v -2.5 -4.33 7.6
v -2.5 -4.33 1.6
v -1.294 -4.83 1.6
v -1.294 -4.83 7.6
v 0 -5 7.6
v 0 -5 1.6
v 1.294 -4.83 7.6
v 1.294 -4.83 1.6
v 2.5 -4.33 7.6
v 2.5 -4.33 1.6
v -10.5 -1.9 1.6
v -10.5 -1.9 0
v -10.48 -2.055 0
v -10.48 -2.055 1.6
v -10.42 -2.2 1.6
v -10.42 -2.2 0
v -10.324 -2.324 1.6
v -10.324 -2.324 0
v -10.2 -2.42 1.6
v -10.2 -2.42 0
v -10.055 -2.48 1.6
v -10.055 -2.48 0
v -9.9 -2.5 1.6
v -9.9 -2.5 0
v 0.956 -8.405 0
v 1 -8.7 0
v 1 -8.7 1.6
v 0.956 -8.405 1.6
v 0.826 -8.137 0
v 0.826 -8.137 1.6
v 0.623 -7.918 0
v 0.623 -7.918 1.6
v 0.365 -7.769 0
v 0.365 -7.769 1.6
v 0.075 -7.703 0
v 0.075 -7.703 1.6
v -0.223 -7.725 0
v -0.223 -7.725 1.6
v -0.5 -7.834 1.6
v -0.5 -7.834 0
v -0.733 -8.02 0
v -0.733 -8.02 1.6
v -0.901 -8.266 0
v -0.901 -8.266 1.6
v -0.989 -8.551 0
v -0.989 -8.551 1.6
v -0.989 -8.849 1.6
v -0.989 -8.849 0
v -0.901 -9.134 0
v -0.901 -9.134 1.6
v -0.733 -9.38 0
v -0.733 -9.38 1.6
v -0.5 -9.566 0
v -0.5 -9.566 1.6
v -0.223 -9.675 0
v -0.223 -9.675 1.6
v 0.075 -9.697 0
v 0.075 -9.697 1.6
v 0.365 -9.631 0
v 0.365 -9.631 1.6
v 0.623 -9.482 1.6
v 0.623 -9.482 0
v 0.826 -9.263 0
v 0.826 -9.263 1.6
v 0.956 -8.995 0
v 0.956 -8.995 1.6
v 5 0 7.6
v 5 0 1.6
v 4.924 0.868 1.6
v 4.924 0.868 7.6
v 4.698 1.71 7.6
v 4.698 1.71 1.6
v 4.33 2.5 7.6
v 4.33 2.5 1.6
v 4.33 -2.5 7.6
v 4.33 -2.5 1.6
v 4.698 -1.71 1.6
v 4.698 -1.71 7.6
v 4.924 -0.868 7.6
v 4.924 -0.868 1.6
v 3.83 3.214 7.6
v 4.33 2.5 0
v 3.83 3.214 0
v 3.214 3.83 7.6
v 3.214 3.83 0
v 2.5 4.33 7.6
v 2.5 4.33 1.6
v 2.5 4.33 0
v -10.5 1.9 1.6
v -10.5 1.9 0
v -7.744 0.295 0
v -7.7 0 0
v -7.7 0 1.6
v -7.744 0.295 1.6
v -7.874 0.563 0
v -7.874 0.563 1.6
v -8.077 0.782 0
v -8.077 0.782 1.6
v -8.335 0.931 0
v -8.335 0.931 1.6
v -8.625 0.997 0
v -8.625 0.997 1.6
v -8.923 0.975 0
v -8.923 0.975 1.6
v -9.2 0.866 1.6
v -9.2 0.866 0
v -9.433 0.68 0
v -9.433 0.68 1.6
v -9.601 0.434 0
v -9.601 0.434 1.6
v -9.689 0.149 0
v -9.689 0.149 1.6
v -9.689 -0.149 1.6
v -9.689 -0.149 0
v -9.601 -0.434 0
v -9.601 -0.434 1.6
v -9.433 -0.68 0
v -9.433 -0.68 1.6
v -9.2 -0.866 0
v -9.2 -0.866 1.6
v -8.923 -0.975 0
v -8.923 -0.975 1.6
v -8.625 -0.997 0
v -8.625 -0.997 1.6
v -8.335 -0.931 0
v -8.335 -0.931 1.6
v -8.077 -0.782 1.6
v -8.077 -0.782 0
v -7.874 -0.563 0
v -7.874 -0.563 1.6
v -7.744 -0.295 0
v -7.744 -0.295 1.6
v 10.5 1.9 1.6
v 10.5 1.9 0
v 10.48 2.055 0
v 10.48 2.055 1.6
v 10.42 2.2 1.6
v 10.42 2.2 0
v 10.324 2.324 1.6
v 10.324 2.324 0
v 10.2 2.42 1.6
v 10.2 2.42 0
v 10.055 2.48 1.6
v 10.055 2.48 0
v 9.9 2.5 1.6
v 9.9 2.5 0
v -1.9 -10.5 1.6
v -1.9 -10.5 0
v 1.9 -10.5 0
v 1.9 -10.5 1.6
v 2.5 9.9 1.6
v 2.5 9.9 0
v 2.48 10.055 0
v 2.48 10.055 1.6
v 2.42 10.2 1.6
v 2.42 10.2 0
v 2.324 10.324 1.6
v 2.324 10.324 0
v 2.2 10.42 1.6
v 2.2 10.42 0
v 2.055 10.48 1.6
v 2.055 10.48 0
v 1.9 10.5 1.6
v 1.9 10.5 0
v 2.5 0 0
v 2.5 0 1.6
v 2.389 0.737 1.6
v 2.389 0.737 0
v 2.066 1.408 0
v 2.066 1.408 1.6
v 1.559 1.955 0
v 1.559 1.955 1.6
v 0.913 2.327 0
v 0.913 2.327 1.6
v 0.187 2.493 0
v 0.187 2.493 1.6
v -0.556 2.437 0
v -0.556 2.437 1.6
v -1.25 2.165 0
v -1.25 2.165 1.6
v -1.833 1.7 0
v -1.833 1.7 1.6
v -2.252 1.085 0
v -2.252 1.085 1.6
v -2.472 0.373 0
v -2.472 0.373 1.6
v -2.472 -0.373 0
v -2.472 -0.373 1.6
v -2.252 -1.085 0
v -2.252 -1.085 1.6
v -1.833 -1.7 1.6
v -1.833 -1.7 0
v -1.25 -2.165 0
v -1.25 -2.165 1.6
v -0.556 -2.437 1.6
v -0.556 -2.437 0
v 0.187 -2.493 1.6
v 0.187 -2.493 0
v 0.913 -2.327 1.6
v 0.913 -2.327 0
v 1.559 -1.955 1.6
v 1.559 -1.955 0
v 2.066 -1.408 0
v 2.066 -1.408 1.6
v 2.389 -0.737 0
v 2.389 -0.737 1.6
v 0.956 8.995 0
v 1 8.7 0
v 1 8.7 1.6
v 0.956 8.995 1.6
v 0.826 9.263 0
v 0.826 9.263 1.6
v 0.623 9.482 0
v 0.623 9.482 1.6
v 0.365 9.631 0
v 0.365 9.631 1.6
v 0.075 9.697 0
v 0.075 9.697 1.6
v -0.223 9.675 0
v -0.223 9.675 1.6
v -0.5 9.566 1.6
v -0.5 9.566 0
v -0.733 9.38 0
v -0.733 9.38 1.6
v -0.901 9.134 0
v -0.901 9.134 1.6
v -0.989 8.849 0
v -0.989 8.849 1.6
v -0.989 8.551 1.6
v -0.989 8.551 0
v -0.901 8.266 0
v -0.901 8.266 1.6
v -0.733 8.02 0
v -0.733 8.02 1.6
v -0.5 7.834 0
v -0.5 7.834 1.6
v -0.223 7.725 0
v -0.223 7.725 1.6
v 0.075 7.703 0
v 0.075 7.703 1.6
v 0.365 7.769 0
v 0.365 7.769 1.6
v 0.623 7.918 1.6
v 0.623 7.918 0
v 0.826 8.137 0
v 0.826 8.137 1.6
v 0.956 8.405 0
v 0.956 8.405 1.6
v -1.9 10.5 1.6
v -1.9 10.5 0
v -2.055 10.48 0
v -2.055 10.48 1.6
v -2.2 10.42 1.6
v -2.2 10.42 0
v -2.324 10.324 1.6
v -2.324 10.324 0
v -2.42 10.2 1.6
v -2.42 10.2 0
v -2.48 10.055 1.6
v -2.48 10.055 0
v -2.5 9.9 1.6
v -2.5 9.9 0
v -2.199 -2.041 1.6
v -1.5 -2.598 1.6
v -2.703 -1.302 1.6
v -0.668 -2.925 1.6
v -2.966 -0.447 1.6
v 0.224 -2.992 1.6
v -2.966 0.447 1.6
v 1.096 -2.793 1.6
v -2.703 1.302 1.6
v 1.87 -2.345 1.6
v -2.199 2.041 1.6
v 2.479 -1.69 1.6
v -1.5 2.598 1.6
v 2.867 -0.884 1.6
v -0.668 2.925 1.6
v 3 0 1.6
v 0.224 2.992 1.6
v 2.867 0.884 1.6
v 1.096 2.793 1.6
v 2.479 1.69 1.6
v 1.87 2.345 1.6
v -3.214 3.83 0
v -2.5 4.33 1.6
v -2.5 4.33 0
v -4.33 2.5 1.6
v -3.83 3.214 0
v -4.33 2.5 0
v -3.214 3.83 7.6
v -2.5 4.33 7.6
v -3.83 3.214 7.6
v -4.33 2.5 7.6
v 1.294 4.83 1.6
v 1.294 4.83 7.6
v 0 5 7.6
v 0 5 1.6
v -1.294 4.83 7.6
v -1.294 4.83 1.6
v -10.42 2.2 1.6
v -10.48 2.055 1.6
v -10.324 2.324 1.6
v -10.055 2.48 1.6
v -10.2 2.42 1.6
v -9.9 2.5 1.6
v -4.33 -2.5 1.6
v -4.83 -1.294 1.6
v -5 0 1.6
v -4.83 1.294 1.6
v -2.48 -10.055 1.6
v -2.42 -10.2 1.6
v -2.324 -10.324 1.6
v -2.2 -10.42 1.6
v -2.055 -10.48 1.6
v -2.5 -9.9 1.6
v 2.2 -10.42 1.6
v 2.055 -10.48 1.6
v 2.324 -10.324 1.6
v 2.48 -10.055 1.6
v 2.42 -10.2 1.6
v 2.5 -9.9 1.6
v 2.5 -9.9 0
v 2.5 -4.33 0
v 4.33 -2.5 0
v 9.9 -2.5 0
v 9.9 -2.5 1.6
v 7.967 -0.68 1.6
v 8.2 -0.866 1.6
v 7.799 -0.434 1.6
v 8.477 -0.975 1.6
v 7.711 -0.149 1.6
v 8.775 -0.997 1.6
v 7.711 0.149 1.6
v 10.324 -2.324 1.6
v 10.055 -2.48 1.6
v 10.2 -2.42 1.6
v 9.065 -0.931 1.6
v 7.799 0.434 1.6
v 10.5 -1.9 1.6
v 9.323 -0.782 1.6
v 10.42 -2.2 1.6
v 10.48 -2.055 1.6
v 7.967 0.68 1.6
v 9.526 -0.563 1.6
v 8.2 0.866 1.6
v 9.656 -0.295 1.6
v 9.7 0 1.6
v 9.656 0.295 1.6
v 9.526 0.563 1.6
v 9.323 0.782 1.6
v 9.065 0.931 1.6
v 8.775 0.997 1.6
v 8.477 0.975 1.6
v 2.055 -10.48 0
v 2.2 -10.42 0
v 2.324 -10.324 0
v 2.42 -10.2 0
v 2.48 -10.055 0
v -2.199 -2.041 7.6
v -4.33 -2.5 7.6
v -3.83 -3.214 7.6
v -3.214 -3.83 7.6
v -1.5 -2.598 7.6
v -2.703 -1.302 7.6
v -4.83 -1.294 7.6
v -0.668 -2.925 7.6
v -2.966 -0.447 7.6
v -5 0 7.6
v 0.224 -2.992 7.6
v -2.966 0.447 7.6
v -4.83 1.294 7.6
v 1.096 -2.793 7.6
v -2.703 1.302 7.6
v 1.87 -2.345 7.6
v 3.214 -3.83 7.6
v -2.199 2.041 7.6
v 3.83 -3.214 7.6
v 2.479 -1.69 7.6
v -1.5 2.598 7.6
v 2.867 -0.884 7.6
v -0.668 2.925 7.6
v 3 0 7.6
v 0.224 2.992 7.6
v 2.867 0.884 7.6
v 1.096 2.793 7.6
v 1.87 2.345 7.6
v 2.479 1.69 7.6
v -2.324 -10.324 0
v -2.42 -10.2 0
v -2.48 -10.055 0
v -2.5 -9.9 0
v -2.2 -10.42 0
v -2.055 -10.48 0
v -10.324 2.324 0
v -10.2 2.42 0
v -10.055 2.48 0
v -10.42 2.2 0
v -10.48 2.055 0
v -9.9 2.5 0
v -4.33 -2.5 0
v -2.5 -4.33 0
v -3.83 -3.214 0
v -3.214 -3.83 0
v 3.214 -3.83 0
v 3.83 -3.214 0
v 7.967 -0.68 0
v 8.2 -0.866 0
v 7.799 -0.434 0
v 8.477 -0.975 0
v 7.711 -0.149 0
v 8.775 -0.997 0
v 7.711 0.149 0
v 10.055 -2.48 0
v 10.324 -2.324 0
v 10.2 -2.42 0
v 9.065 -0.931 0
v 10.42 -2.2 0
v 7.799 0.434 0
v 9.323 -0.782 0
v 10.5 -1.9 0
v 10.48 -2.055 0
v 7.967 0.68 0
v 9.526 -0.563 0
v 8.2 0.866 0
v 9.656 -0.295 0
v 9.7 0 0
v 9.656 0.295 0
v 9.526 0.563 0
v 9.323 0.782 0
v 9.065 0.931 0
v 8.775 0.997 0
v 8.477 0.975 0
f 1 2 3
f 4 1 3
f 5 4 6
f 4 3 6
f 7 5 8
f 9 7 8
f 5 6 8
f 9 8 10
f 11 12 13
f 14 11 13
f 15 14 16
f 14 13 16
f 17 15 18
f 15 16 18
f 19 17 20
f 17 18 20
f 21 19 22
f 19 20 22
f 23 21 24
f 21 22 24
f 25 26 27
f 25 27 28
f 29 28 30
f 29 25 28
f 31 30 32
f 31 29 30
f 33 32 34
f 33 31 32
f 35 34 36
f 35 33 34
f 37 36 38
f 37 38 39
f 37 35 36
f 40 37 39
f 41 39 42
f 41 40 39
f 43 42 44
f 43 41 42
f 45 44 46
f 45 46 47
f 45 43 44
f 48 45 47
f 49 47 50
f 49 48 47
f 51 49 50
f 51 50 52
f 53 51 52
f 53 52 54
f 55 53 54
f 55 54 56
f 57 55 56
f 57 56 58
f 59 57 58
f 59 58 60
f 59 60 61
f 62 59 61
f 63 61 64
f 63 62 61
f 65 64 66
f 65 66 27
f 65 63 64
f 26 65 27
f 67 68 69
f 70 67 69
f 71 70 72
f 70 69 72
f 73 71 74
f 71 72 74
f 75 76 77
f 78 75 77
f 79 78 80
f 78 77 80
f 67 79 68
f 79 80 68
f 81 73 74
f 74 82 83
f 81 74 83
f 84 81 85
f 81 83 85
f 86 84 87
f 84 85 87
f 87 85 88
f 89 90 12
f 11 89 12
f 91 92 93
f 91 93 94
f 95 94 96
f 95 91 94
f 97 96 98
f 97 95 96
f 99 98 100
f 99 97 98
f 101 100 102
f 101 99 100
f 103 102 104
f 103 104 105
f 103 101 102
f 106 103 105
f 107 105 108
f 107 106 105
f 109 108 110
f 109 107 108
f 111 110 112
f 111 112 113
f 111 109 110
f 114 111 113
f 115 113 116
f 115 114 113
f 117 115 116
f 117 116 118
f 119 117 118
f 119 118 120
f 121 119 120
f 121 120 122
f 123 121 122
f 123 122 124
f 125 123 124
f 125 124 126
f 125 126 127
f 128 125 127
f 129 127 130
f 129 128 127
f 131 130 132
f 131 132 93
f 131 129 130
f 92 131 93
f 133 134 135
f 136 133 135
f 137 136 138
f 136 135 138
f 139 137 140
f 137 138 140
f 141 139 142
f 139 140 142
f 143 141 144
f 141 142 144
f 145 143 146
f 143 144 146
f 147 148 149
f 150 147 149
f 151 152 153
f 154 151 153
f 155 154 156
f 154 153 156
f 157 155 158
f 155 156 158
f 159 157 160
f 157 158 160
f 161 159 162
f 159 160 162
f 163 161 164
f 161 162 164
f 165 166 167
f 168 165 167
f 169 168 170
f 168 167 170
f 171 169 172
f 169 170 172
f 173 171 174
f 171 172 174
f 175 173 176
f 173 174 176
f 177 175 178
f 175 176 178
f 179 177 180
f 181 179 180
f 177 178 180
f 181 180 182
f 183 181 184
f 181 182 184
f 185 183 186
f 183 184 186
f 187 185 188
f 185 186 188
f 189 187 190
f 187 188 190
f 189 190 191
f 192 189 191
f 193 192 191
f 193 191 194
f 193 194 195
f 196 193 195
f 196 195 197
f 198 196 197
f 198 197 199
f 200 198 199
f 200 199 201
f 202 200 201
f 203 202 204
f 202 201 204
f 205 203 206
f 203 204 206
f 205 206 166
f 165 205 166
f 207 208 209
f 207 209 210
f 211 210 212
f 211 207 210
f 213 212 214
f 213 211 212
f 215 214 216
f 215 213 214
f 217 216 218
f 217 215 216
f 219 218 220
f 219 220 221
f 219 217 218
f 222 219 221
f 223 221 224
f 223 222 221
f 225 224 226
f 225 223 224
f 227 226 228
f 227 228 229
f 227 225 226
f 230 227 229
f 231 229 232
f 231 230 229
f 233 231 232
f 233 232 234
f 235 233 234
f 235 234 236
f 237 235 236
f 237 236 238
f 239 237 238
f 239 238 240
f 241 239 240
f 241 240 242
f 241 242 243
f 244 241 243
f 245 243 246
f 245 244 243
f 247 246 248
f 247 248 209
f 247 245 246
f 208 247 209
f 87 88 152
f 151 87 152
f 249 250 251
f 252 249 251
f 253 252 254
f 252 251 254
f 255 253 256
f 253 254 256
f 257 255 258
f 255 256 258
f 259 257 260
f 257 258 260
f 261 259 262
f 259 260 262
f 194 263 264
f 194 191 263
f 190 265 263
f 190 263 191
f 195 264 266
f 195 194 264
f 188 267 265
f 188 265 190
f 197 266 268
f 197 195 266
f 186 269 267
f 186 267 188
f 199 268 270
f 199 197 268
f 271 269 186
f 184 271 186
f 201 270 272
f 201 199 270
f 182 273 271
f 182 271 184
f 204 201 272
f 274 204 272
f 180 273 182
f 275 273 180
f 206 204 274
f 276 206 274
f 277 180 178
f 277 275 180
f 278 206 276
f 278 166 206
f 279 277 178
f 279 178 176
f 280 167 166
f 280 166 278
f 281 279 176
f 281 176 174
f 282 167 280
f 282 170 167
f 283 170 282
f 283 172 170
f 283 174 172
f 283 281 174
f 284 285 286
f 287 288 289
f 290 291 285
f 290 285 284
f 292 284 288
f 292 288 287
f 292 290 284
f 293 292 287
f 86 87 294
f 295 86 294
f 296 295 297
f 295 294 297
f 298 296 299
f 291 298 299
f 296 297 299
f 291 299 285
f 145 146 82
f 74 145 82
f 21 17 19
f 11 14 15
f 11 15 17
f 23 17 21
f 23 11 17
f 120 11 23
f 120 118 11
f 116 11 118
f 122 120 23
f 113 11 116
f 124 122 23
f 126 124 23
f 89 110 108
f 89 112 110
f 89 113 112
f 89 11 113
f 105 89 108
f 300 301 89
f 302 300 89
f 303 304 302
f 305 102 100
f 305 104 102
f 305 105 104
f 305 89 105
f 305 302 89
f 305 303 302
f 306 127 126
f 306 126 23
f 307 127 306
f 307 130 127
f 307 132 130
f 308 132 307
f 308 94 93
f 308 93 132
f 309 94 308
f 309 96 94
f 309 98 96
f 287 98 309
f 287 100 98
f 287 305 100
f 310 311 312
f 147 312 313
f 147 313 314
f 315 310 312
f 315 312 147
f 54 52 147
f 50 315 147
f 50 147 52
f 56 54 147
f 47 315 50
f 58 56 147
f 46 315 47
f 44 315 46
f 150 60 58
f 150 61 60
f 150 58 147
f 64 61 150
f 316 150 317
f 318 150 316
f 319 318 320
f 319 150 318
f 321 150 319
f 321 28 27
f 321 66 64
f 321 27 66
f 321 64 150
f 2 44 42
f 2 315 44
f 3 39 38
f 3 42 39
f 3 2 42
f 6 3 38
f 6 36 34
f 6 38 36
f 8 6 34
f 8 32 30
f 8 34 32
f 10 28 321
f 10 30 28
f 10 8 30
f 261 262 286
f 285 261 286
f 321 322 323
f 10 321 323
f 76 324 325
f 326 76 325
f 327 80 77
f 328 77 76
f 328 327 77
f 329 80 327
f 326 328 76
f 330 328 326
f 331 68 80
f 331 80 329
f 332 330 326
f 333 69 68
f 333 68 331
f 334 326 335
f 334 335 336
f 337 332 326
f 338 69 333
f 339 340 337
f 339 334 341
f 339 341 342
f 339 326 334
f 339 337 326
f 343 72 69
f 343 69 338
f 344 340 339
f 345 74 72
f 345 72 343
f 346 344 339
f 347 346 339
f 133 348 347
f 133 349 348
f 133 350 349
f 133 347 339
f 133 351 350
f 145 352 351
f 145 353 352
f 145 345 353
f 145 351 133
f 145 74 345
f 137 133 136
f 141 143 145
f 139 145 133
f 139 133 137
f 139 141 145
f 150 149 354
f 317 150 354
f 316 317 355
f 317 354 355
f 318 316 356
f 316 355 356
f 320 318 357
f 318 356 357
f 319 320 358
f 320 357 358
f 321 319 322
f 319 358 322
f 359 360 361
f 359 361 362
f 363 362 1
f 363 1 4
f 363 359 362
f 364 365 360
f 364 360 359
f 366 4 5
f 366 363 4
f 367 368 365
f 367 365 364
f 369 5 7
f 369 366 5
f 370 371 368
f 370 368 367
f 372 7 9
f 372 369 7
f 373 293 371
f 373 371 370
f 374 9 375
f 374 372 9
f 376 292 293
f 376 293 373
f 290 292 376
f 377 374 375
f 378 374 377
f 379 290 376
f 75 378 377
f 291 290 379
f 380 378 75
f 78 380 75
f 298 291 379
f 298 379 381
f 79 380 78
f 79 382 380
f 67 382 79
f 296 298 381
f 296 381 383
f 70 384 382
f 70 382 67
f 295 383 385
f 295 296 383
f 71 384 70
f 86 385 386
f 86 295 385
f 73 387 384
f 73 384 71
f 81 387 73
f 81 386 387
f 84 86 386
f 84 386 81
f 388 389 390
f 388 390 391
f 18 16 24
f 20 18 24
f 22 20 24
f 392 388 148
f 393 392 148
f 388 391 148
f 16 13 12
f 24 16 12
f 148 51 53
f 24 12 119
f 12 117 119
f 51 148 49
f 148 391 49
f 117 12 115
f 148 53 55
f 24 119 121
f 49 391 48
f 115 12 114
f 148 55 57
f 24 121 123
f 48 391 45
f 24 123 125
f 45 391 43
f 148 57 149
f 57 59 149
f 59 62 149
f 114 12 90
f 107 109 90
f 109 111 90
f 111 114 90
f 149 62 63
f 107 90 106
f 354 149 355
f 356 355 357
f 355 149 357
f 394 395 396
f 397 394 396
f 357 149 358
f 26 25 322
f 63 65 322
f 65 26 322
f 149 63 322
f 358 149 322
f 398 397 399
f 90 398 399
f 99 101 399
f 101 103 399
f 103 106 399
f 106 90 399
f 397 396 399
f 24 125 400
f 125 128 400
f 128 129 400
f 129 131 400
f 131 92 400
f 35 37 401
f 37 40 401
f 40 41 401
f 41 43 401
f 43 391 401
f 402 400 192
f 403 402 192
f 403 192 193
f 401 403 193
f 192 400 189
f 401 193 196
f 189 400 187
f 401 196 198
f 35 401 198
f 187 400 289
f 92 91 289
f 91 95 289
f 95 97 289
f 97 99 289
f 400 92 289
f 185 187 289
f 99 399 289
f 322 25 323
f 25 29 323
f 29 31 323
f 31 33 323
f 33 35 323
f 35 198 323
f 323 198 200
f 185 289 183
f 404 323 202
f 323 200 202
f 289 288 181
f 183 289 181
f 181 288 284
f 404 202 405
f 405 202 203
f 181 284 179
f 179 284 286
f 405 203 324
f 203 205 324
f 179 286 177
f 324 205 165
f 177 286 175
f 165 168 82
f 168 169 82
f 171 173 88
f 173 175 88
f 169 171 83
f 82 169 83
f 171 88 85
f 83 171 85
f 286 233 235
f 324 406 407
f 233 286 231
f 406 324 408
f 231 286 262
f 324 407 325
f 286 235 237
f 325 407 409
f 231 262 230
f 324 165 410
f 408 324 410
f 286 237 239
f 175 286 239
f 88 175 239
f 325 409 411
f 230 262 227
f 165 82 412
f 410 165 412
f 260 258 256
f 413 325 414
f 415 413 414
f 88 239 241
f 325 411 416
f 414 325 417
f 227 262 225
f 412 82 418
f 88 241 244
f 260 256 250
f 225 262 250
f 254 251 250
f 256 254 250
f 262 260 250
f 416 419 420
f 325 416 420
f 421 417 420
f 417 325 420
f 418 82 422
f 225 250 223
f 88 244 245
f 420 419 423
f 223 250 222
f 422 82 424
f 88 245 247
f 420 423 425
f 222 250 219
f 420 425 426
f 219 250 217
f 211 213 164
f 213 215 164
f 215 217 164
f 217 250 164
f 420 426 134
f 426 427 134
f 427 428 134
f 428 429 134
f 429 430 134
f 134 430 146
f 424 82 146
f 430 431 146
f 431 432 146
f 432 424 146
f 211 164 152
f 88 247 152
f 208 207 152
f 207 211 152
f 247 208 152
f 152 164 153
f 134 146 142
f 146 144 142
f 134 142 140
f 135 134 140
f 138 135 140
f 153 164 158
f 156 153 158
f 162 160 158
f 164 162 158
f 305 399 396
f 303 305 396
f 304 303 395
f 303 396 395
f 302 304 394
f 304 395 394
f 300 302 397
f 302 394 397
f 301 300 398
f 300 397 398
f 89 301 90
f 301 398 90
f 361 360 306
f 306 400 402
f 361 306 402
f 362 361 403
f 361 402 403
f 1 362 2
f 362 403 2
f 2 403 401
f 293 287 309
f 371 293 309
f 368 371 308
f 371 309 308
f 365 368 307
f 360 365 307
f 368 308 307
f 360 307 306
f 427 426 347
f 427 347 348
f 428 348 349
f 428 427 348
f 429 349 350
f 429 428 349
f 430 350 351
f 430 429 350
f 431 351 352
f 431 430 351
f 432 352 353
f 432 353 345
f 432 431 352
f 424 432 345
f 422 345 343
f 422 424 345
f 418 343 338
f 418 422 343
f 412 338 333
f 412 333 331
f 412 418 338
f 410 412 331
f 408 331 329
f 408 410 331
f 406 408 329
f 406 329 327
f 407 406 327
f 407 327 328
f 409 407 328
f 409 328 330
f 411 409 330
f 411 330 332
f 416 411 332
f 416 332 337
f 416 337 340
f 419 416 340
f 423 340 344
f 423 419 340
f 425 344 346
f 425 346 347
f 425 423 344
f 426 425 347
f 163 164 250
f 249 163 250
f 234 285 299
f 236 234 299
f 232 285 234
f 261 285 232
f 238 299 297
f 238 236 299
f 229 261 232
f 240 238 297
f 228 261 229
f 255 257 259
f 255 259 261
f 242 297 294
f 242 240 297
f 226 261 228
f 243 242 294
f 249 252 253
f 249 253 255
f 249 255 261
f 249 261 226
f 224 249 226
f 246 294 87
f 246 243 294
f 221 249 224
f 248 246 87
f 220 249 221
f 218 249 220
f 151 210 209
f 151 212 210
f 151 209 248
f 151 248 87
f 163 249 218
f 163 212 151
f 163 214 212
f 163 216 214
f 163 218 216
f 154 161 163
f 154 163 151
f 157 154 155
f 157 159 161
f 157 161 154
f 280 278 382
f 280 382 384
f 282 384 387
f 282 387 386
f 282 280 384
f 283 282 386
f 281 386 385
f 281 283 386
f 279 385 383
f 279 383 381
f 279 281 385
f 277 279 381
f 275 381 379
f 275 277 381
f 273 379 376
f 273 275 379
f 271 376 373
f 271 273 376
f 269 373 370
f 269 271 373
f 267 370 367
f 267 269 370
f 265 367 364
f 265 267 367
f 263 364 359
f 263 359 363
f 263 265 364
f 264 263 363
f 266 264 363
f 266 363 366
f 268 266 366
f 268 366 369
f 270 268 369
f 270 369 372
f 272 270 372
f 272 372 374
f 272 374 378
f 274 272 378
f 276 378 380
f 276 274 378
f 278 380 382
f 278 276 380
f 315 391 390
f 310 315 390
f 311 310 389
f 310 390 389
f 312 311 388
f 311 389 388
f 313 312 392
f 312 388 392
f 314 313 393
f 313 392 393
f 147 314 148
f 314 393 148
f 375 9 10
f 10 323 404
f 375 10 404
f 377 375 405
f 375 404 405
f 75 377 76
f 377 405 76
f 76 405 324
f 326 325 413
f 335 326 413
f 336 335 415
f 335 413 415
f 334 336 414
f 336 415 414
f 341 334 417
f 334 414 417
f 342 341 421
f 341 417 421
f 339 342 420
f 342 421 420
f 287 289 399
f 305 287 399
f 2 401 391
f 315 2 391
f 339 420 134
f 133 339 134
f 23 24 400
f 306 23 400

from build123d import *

# Parameters (mm, degrees)
F0_R     = 1
F0_W     = 5
F0_H     = 5
F1_DEPTH = 1.6
F2_R     = 3
F3_DEPTH = 6
F4_DEPTH = 1.6
F5_R     = 2.5
F6_DEPTH = 1.6


with BuildPart() as f1:
    # F0 (on Top) → F1 (new body)
    with BuildSketch(Plane.XY):
        with BuildLine():
            ThreePointArc((10.5, 1.9), (10.3242640687, 2.3242640687), (9.9, 2.5))
            Line((9.9, 2.5), (2.5, 2.5))
            Line((2.5, 2.5), (2.5, -2.5))
            Line((2.5, -2.5), (9.9, -2.5))
            ThreePointArc((9.9, -2.5), (10.3242640687, -2.3242640687), (10.5, -1.9))
            Line((10.5, -1.9), (10.5, 1.9))
        make_face()
        with Locations((8.7, 0)):
            Circle(F0_R, mode=Mode.SUBTRACT)
        Rectangle(F0_W, F0_H)
        with BuildLine():
            Line((-2.5, 2.5), (2.5, 2.5))
            Line((2.5, 2.5), (2.5, 9.9))
            ThreePointArc((2.5, 9.9), (2.3242640687, 10.3242640687), (1.9, 10.5))
            Line((1.9, 10.5), (-1.9, 10.5))
            ThreePointArc((-1.9, 10.5), (-2.3242640687, 10.3242640687), (-2.5, 9.9))
            Line((-2.5, 9.9), (-2.5, 2.5))
        make_face()
        with Locations((0, 8.7)):
            Circle(F0_R, mode=Mode.SUBTRACT)
        with BuildLine():
            Line((-2.5, -2.5), (-2.5, 2.5))
            Line((-2.5, 2.5), (-9.9, 2.5))
            ThreePointArc((-9.9, 2.5), (-10.3242640687, 2.3242640687), (-10.5, 1.9))
            Line((-10.5, 1.9), (-10.5, -1.9))
            ThreePointArc((-10.5, -1.9), (-10.3242640687, -2.3242640687), (-9.9, -2.5))
            Line((-9.9, -2.5), (-2.5, -2.5))
        make_face()
        with Locations((-8.7, 0)):
            Circle(F0_R, mode=Mode.SUBTRACT)
        with BuildLine():
            Line((2.5, -9.9), (2.5, -2.5))
            Line((2.5, -2.5), (-2.5, -2.5))
            Line((-2.5, -2.5), (-2.5, -9.9))
            ThreePointArc((-2.5, -9.9), (-2.3242640687, -10.3242640687), (-1.9, -10.5))
            Line((-1.9, -10.5), (1.9, -10.5))
            ThreePointArc((1.9, -10.5), (2.3242640687, -10.3242640687), (2.5, -9.9))
        make_face()
        with Locations((0, -8.7)):
            Circle(F0_R, mode=Mode.SUBTRACT)
    extrude(amount=F1_DEPTH)

    # F2 (on face) → F3 (join)
    with BuildSketch(Plane.XY.offset(1.6)):
        with BuildLine():
            ThreePointArc((4.3301270189, -2.5), (4.8296291314, -1.2940952255), (5, 0))
            ThreePointArc((5, 0), (4.8296291314, 1.2940952255), (4.3301270189, 2.5))
            Line((4.3301270189, 2.5), (2.5, 2.5))
            Line((2.5, 2.5), (2.5, 4.3301270189))
            ThreePointArc((2.5, 4.3301270189), (0, 5), (-2.5, 4.3301270189))
            Line((-2.5, 4.3301270189), (-2.5, 2.5))
            Line((-2.5, 2.5), (-4.3301270189, 2.5))
            ThreePointArc((-4.3301270189, 2.5), (-5, 0), (-4.3301270189, -2.5))
            Line((-4.3301270189, -2.5), (-2.5, -2.5))
            Line((-2.5, -2.5), (-2.5, -4.3301270189))
            ThreePointArc((-2.5, -4.3301270189), (0, -5), (2.5, -4.3301270189))
            Line((2.5, -4.3301270189), (2.5, -2.5))
            Line((2.5, -2.5), (4.3301270189, -2.5))
        make_face()
        Circle(F2_R, mode=Mode.SUBTRACT)
        with BuildLine():
            ThreePointArc((-4.3301270189, -2.5), (-3.5355339059, -3.5355339059), (-2.5, -4.3301270189))
            Line((-2.5, -4.3301270189), (-2.5, -2.5))
            Line((-2.5, -2.5), (-4.3301270189, -2.5))
        make_face()
        with BuildLine():
            ThreePointArc((2.5, -4.3301270189), (3.5355339059, -3.5355339059), (4.3301270189, -2.5))
            Line((4.3301270189, -2.5), (2.5, -2.5))
            Line((2.5, -2.5), (2.5, -4.3301270189))
        make_face()
        with BuildLine():
            Line((2.5, 2.5), (4.3301270189, 2.5))
            ThreePointArc((4.3301270189, 2.5), (3.5355339059, 3.5355339059), (2.5, 4.3301270189))
            Line((2.5, 4.3301270189), (2.5, 2.5))
        make_face()
        with BuildLine():
            Line((-2.5, 2.5), (-2.5, 4.3301270189))
            ThreePointArc((-2.5, 4.3301270189), (-3.5355339059, 3.5355339059), (-4.3301270189, 2.5))
            Line((-4.3301270189, 2.5), (-2.5, 2.5))
        make_face()
    extrude(amount=F3_DEPTH)

    # F4 (add, through all): faces of the model
    f4_faces = [f1.faces().sort_by_distance(p)[0] for p in [
        (-3.1629509292, 3.1629509292, 1.6),
        (3.1629509292, 3.1629509292, 1.6),
        (-3.1629509292, -3.1629509292, 1.6),
        (3.1629509292, -3.1629509292, 1.6),
    ]]
    extrude(f4_faces, amount=F4_DEPTH)

    # F5 (on face) → F6 (cut, through all)
    with BuildSketch(Plane.XY.offset(1.6)):
        Circle(F5_R)
    extrude(amount=-F6_DEPTH, mode=Mode.SUBTRACT)


solid = f1.part
